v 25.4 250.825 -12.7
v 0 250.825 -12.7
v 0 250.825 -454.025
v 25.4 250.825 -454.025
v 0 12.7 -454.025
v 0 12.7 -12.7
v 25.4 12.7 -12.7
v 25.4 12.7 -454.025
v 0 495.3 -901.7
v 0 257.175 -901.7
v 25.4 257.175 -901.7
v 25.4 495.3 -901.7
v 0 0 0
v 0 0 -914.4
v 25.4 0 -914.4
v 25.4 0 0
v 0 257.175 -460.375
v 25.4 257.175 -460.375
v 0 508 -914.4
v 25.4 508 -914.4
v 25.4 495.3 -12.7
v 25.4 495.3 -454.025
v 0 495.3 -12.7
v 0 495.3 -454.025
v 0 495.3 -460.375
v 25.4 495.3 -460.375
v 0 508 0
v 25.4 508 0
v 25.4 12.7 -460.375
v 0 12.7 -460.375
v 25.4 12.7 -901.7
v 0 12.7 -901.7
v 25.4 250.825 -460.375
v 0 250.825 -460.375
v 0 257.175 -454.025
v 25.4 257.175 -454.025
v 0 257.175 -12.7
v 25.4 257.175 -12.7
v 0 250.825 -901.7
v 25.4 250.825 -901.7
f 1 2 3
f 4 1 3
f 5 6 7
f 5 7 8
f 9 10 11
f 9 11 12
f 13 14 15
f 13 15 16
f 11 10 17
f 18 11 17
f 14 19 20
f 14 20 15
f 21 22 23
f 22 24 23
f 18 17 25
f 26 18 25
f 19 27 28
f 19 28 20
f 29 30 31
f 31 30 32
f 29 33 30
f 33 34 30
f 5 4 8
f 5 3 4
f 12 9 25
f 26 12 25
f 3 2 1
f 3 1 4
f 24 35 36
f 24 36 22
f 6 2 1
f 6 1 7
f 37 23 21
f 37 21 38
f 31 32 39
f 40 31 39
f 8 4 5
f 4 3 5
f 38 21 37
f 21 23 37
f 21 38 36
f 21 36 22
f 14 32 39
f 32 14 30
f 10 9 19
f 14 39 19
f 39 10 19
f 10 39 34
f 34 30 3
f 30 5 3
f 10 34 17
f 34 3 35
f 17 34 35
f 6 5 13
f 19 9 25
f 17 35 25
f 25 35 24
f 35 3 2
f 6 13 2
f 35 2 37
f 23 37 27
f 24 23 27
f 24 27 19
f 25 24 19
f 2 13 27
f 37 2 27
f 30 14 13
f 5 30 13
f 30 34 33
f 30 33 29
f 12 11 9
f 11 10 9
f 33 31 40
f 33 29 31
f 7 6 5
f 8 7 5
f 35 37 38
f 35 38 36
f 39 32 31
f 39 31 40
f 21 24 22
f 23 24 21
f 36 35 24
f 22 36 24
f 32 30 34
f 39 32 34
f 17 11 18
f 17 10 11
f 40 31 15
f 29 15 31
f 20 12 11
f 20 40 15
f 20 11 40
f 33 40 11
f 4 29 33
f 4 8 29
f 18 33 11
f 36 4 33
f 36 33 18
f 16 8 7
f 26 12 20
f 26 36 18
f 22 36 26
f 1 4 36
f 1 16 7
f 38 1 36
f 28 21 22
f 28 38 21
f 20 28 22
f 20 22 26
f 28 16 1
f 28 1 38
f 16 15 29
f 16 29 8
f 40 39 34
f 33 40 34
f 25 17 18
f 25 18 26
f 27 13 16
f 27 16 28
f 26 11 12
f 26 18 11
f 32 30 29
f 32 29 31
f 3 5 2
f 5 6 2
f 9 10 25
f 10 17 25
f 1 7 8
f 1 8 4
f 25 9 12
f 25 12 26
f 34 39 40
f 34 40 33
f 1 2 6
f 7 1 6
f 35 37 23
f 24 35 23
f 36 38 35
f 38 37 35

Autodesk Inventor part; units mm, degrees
ref_plane "YZ Plane" through (0, 0, 0) normal (1, 0, 0) x (0, 1, 0)
ref_plane "XZ Plane" through (0, 0, 0) normal (0, 1, 0) x (-1, 0, 0)
ref_plane "XY Plane" through (0, 0, 0) normal (0, 0, 1) x (1, 0, 0)
sketch "Sketch1" plane through (0, 0, 0) normal (1, 0, 0) x (0, 1, 0)
  line L0 (0, 0) -> (508, 0)
  line L1 (508, 0) -> (508, -914.4)
  line L2 (508, -914.4) -> (0, -914.4)
  line L3 (0, -914.4) -> (0, 0)
  line L4 (495.3, -901.7) -> (495.3, -12.7)
  line L5 (495.3, -12.7) -> (12.7, -12.7)
  line L6 (12.7, -12.7) -> (12.7, -901.7)
  line L7 (12.7, -901.7) -> (495.3, -901.7)
  line L8 (495.3, -12.7) -> (257.175, -12.7)
  line L9 (257.175, -12.7) -> (257.175, -454.025)
  line L10 (257.175, -454.025) -> (495.3, -454.025)
  line L11 (495.3, -454.025) -> (495.3, -12.7)
  line L12 (495.3, -901.7) -> (257.175, -901.7)
  line L13 (257.175, -901.7) -> (257.175, -460.375)
  line L14 (257.175, -460.375) -> (495.3, -460.375)
  line L15 (495.3, -460.375) -> (495.3, -901.7)
  line L16 (12.7, -901.7) -> (250.825, -901.7)
  line L17 (250.825, -901.7) -> (250.825, -460.375)
  line L18 (250.825, -460.375) -> (12.7, -460.375)
  line L19 (12.7, -460.375) -> (12.7, -901.7)
  line L20 (12.7, -12.7) -> (250.825, -12.7)
  line L21 (250.825, -12.7) -> (250.825, -454.025)
  line L22 (250.825, -454.025) -> (12.7, -454.025)
  line L23 (12.7, -454.025) -> (12.7, -12.7)
  dimension "d0" = 914.4
  dimension "d1" = 508
  dimension "d3" = 12.7
  dimension "d4" = 6.35
  dimension "d5" = 6.35
extrude "Extrusion1" add sketch "Sketch1" along normal blind 25.4 contours L7 L13 L14 L4 | L10 L9 L5 L4 | L7 L6 L18 L17 | L21 L22 L6 L5
extrude "Extrusion2" add sketch "Sketch1" along normal blind 25.4 separate body contours L0 L1 L2 L3 | L14 L13 L7 L17 L18 L6 L22 L21 L5 L9 L10 L4
equation "\"d5\" = d4"
properties part number "Window"
